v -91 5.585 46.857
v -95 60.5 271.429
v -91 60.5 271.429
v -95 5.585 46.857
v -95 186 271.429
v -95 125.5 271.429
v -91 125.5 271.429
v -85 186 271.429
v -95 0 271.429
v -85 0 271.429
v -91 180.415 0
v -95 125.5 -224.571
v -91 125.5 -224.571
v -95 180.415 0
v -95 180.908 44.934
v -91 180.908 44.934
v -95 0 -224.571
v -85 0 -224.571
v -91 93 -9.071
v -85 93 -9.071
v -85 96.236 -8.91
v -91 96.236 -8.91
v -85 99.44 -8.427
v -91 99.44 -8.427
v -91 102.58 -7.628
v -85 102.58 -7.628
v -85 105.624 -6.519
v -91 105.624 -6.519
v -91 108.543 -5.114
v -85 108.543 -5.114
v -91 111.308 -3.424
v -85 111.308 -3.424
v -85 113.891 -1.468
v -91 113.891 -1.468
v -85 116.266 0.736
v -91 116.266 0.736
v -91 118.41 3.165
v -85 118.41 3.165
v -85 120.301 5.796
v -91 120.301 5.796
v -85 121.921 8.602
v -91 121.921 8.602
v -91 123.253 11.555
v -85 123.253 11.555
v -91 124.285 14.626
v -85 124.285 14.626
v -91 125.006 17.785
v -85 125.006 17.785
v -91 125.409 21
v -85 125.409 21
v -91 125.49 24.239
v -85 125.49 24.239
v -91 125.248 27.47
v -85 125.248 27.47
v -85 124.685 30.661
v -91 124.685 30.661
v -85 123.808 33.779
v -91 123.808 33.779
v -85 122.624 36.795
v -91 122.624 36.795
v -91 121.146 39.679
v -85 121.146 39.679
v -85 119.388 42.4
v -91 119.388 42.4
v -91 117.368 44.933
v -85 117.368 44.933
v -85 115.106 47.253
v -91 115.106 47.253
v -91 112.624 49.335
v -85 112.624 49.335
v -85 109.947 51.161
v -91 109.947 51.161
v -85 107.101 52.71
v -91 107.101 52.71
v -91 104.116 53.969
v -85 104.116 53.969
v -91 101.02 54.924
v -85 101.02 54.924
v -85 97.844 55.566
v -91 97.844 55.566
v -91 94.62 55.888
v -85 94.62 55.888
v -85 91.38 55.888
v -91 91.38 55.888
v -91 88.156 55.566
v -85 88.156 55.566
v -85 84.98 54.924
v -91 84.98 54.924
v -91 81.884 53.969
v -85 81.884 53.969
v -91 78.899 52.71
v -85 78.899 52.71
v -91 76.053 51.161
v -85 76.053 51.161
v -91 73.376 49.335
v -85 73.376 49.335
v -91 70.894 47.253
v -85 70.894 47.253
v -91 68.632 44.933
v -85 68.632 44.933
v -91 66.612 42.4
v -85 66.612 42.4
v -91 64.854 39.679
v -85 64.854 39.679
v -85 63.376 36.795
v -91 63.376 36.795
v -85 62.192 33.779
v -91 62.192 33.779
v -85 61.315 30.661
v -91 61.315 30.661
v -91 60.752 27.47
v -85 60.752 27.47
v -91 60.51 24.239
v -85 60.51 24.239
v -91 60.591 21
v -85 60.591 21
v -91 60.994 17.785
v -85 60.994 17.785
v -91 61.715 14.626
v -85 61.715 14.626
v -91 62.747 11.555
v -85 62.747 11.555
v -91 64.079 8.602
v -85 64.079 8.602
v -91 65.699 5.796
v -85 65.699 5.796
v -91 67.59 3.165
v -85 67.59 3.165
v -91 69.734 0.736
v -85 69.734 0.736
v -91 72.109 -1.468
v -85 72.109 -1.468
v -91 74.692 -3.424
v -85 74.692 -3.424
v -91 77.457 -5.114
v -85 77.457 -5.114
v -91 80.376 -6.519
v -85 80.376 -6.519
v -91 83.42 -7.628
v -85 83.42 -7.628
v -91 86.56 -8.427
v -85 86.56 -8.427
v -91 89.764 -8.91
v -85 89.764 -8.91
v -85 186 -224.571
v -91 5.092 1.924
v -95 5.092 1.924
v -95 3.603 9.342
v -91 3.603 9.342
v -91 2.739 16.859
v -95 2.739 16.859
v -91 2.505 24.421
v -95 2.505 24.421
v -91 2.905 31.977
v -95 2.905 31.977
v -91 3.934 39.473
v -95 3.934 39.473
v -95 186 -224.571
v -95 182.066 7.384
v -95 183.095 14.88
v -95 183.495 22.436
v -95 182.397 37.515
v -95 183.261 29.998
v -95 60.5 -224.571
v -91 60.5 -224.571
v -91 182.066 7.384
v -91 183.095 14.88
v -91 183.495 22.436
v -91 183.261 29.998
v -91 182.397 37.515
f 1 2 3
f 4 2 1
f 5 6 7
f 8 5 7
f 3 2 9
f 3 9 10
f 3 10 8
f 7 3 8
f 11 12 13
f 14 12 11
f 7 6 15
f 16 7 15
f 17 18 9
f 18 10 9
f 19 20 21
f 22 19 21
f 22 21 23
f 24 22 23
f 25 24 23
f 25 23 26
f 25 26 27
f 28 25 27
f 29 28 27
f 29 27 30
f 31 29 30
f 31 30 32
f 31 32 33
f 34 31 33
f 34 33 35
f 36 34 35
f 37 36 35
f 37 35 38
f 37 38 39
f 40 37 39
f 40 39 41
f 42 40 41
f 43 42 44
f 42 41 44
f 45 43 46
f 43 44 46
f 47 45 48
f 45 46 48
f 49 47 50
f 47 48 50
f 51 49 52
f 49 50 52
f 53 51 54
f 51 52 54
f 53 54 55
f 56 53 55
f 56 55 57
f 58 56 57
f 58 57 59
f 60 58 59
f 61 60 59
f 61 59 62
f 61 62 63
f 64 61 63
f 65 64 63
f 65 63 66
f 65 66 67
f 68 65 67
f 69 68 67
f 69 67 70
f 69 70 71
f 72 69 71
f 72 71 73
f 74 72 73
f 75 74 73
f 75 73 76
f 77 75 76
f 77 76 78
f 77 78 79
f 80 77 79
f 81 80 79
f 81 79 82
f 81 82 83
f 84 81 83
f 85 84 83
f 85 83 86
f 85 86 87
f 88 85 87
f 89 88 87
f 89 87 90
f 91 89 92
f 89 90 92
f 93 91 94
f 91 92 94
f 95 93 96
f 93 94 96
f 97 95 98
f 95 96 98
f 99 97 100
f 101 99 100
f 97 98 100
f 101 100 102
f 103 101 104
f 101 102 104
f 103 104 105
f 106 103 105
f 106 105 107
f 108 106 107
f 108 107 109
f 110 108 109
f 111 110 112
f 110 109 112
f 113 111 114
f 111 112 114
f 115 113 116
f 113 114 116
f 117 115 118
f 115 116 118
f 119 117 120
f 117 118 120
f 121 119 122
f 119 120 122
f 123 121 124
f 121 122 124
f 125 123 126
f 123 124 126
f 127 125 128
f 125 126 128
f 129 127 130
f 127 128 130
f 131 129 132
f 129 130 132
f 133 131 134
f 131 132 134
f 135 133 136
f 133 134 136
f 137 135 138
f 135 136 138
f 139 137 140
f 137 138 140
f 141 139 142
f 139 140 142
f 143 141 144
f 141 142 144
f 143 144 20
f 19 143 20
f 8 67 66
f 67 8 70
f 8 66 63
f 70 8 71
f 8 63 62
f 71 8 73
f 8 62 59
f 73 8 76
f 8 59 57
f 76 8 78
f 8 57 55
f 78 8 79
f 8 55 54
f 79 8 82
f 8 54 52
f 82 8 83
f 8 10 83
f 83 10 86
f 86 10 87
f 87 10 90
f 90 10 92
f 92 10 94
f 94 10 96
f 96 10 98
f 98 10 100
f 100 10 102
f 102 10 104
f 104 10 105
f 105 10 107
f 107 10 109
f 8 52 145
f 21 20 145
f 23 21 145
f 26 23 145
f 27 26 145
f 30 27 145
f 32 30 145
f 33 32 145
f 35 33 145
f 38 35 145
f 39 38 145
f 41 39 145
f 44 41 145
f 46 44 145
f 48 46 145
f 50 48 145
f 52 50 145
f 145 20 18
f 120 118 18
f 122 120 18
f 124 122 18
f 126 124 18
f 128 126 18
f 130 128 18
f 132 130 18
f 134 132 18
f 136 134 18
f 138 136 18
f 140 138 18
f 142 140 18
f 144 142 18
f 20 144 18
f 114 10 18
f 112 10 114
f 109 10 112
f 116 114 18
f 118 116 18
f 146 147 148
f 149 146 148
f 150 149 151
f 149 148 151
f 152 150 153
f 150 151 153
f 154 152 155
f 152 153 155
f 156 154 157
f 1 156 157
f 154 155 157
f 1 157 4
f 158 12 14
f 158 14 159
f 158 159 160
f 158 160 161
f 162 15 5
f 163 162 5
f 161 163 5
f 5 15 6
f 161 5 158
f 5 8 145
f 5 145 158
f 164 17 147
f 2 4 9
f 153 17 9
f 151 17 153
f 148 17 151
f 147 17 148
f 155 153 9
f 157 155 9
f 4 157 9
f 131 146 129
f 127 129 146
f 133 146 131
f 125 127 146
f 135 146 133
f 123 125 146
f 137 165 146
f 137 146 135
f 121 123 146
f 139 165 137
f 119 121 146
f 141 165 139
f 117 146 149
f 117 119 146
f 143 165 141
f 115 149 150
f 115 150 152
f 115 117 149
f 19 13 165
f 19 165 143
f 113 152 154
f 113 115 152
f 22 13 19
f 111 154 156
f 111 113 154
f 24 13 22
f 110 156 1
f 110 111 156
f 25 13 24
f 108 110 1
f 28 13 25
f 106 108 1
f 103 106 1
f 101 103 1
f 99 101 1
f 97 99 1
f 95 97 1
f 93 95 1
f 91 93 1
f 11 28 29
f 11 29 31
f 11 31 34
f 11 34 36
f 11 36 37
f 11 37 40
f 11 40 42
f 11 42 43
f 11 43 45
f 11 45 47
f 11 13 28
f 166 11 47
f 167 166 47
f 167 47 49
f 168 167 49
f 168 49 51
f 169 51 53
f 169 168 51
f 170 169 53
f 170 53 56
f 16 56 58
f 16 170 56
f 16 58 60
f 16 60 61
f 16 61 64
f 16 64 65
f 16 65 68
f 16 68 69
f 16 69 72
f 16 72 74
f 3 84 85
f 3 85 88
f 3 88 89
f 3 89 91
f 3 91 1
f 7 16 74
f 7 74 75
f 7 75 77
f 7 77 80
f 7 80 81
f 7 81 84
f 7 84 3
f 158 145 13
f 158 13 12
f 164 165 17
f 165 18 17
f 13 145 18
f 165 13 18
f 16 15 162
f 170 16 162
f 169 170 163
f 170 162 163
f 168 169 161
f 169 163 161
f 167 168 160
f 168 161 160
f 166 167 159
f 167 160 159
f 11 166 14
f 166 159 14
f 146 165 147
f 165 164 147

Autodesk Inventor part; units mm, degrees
ref_plane "YZ Plane" through (0, 0, 0) normal (1, 0, 0) x (0, 1, 0)
ref_plane "XZ Plane" through (0, 0, 0) normal (0, 1, 0) x (-1, 0, 0)
ref_plane "XY Plane" through (0, 0, 0) normal (0, 0, 1) x (1, 0, 0)
sketch "Sketch1" plane through (0, 0, 0) normal (0, 1, 0) x (-1, 0, 0)
  line L0 (95, 271.4286) -> (85, 271.4286)
  line L1 (85, 271.4286) -> (85, -224.5714)
  line L2 (85, -224.5714) -> (95, -224.5714)
  line L3 (95, -224.5714) -> (95, 271.4286)
  point P0 (0, 0)
  dimension "d0" = 10
  dimension "d1" = 496
extrude "Extrusion1" add sketch "Sketch1" along normal blind 186
sketch "Sketch3" plane through (-85, 0, 271.4286) normal (1, 0, 0) x (0, 0, -1)
  line L0 (0, 0) -> (496, 0) projected
  line L1 (496, 0) -> (496, 186) projected
  line L2 (0, 186) -> (496, 186) projected
  line L3 (0, 0) -> (0, 186) projected
  circle A0 centre (0, 93) radius 5
  line L4 (0, 0) -> (496, 0) projected
  circle A1 centre (248, 0) radius 5
  line L5 (0, 0) -> (248, 0)
  line L6 (0, 93) -> (0, 0)
  circle A2 centre (248, 93) radius 32.5
  point P0 (271.4286, 0)
  dimension "d16" = 65
  dimension "d19" = 93
  dimension "d20" = 248
  dimension "d21" = 248
  dimension "d22" = 93
extrude "Extrusion5" cut sketch "Sketch3" against normal blind 186 contours A2
sketch "Sketch5" plane through (-95, 0, -224.5714) normal (-1, 0, 0) x (0, 0, 1)
  circle A0 centre (248, 93) radius 32.5 projected
  circle A1 centre (248, 93) radius 90.5
  line L0 (0, 0) -> (0, 186) projected
  circle A2 centre (0, 93) radius 32.5
  line L1 (496, 0) -> (496, 186) projected
  circle A3 centre (496, 93) radius 32.5
  line L2 (0, 60.5) -> (226.495, 5.0922)
  line L3 (0, 125.5) -> (224.5714, 180.4148)
  line L4 (496, 125.5) -> (269.505, 180.9078)
  line L5 (496, 60.5) -> (271.4286, 5.5852)
  point P0 (224.5714, 0)
  dimension "d23" = 181
extrude "Extrusion6" cut sketch "Sketch5" against normal blind 4 contours A1 | A1 L4 A3 L5 | A1 L2 A2 L3 | L1 A3 | A2 L0 picked at (485.2457, 91.6942) picked at (6.7545, 84.5302)
properties part number "Osnova" material "Aluminum 6061"
